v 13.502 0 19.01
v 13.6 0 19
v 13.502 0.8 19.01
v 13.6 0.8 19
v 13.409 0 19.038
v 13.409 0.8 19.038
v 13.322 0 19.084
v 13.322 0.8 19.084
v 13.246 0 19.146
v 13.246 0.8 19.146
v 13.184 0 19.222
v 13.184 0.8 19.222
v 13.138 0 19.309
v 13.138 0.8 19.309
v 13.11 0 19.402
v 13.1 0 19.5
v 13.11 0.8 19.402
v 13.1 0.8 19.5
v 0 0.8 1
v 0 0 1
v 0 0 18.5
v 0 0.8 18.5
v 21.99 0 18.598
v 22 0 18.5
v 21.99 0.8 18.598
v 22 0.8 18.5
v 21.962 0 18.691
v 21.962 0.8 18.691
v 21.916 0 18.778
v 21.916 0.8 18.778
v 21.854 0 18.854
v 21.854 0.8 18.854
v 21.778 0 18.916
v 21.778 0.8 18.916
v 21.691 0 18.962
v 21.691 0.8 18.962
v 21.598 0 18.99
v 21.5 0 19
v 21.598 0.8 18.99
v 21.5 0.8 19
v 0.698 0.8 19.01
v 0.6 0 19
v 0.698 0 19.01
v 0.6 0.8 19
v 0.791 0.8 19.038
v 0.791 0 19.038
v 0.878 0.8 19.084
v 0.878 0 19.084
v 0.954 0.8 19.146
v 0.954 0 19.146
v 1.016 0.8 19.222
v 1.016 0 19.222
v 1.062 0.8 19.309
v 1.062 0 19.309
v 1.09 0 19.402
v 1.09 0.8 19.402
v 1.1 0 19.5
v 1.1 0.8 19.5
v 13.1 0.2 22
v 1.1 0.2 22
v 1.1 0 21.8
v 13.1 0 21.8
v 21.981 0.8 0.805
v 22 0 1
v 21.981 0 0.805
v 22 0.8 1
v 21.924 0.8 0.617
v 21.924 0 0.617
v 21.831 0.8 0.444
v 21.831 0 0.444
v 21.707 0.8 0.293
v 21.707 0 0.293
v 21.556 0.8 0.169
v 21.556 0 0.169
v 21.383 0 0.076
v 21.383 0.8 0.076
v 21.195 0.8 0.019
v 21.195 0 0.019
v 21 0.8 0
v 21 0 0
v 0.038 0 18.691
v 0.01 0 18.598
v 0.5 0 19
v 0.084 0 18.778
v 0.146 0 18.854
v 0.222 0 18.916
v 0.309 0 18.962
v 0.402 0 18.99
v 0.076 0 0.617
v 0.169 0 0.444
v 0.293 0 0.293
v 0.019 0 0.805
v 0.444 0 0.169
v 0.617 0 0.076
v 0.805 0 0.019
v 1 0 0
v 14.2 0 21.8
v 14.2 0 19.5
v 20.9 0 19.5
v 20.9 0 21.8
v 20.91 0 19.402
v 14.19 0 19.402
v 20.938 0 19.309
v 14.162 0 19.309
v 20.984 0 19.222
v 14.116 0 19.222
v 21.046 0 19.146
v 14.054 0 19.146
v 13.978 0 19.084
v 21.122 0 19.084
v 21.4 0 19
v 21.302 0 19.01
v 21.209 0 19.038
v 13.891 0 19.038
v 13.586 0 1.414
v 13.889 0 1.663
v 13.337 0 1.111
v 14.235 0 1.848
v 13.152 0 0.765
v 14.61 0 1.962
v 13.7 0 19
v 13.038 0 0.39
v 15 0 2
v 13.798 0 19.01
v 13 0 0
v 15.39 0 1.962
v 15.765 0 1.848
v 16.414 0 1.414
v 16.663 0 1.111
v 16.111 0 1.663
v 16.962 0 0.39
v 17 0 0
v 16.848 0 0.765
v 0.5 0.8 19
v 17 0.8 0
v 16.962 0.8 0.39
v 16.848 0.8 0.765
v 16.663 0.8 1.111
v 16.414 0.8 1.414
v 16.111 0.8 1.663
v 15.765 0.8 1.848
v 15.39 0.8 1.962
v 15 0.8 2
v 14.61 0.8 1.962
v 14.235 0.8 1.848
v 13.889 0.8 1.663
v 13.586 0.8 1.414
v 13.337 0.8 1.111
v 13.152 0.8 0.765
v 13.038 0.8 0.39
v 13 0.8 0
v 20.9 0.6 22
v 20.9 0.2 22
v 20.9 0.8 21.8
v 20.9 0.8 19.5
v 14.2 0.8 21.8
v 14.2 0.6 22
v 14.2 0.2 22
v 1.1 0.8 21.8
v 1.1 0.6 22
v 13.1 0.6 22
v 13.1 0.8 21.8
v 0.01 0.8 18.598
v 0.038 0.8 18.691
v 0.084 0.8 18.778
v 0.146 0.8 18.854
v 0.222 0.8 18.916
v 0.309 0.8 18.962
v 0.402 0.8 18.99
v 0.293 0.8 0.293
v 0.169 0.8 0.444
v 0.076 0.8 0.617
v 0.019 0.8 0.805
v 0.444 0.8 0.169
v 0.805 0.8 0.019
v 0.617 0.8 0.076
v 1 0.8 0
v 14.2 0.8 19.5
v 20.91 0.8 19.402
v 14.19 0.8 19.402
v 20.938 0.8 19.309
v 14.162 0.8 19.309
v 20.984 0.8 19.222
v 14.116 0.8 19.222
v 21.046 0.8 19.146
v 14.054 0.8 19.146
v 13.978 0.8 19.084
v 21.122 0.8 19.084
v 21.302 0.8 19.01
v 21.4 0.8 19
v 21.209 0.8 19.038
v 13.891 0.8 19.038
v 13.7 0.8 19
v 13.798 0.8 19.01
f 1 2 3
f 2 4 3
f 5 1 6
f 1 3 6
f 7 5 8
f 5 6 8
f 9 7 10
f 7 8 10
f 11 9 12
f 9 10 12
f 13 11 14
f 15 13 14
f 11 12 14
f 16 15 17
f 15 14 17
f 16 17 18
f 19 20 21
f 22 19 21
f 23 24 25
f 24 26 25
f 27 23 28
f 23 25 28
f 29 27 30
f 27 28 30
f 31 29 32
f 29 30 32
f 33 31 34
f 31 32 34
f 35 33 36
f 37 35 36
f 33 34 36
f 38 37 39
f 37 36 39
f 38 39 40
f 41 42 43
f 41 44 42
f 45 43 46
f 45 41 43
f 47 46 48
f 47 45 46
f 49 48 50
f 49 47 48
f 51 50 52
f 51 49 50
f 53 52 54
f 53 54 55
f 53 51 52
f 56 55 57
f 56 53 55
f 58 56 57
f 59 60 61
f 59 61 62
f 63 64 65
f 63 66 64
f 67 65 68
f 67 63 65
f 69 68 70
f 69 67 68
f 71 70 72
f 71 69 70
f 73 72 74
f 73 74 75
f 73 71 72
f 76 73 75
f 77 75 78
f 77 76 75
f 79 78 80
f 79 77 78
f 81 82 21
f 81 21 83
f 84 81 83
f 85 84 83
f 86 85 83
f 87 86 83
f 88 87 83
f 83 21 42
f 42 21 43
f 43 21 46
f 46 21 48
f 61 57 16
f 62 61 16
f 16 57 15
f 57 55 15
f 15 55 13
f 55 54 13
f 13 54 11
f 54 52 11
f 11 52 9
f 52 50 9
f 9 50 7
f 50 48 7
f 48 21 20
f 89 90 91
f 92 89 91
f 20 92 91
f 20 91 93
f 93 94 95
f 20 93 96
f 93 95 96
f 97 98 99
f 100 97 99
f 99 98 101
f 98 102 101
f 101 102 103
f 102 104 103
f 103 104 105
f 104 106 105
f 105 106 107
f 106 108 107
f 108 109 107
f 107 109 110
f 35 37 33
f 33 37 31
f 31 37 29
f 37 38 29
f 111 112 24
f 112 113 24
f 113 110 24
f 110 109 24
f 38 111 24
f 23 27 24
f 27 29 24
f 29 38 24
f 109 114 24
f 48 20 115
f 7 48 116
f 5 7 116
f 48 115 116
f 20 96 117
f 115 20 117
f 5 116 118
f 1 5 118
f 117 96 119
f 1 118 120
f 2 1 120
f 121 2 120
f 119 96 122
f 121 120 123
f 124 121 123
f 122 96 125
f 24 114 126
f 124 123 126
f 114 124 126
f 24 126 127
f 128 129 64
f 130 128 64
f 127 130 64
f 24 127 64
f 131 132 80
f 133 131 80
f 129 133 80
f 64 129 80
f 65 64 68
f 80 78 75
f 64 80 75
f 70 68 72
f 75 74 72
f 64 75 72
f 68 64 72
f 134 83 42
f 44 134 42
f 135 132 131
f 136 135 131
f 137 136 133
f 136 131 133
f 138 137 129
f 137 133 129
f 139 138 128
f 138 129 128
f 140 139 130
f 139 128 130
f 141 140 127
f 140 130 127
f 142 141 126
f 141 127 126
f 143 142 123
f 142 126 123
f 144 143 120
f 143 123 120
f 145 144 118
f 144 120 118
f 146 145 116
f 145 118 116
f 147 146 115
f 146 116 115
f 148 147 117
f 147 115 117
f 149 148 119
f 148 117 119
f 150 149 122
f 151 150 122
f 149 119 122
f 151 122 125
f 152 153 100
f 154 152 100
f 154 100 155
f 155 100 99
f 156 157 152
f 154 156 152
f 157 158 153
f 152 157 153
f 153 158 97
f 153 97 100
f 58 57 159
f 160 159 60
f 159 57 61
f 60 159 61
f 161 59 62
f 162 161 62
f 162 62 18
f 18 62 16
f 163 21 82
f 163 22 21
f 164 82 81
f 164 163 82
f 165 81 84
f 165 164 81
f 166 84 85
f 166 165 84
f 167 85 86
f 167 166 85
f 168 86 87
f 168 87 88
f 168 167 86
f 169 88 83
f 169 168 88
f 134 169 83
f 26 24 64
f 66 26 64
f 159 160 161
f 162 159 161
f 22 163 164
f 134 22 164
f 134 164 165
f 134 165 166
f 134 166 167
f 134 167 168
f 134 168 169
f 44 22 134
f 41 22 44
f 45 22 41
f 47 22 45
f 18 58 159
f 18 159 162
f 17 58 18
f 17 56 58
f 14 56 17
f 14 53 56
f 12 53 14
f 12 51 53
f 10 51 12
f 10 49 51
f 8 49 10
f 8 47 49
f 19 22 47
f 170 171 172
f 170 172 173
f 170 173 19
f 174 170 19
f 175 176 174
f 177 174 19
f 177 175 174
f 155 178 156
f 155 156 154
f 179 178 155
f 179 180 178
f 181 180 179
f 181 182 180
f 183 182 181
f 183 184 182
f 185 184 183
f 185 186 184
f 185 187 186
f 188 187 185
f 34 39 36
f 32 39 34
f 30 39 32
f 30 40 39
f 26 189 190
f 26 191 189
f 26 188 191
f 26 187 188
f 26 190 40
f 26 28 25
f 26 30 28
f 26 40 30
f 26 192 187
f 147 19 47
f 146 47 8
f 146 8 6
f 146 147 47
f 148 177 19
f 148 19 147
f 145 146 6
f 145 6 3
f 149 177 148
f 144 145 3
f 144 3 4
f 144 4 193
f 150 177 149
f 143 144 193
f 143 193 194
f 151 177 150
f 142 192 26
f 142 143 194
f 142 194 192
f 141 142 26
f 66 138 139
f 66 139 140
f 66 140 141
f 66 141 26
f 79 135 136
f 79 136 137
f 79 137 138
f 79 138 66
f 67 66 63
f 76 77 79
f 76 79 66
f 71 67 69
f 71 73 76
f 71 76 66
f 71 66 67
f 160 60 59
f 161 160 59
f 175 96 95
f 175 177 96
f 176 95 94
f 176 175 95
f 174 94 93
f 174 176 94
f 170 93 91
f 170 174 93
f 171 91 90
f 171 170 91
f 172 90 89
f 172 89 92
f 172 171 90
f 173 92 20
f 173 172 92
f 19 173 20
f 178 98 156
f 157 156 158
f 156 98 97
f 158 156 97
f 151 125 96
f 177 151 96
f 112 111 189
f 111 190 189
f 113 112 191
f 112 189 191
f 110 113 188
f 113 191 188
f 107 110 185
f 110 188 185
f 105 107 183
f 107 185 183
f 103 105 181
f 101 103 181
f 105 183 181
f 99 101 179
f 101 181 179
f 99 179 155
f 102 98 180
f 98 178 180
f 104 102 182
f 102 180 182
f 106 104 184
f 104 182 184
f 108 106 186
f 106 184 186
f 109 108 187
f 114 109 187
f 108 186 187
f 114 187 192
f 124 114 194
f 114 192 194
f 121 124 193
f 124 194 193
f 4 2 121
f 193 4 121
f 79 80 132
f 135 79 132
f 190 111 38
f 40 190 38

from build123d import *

# Parameters (mm, degrees)
BOSS_EXTRUDE1_DEPTH = 0.8
FILLET1_R           = 1
FILLET2_R           = 0.5
CHAMFER1_SIZE       = 0.2


with BuildPart() as part:
    # Sketch1 → Boss-Extrude1 (new body)
    with BuildSketch(Plane(origin=(0, 0, 0), x_dir=(1, 0, 0), z_dir=(0, 1, 0))):
        with BuildLine():
            Line((14.2, -22), (20.9, -22))
            Line((20.9, -22), (20.9, -19))
            Line((20.9, -19), (22, -19))
            Line((22, -19), (22, 0))
            Line((22, 0), (17, 0))
            ThreePointArc((17, 0), (15, -2), (13, 0))
            Line((13, 0), (0, 0))
            Line((0, 0), (0, -19))
            Line((0, -19), (1.1, -19))
            Line((1.1, -19), (1.1, -22))
            Line((1.1, -22), (13.1, -22))
            Line((13.1, -22), (13.1, -19))
            Line((13.1, -19), (14.2, -19))
            Line((14.2, -19), (14.2, -22))
        make_face()
    extrude(amount=BOSS_EXTRUDE1_DEPTH)

    # Fillet1
    fillet1_edges = [part.edges().sort_by_distance(p)[0] for p in [
        (0, 0.4, 0),
        (22, 0.4, 0),
    ]]
    fillet(fillet1_edges, radius=FILLET1_R)

    # Fillet2
    fillet2_edges = [part.edges().sort_by_distance(p)[0] for p in [
        (22, 0.4, 19),
        (20.9, 0.4, 19),
        (14.2, 0.4, 19),
        (13.1, 0.4, 19),
        (1.1, 0.4, 19),
        (0, 0.4, 19),
    ]]
    fillet(fillet2_edges, radius=FILLET2_R)

    # Chamfer1
    chamfer1_edges = [part.edges().sort_by_distance(p)[0] for p in [
        (17.55, 0, 22),
        (7.1, 0.8, 22),
        (7.1, 0, 22),
        (17.55, 0.8, 22),
    ]]
    chamfer(chamfer1_edges, length=CHAMFER1_SIZE)


solid = part.part
